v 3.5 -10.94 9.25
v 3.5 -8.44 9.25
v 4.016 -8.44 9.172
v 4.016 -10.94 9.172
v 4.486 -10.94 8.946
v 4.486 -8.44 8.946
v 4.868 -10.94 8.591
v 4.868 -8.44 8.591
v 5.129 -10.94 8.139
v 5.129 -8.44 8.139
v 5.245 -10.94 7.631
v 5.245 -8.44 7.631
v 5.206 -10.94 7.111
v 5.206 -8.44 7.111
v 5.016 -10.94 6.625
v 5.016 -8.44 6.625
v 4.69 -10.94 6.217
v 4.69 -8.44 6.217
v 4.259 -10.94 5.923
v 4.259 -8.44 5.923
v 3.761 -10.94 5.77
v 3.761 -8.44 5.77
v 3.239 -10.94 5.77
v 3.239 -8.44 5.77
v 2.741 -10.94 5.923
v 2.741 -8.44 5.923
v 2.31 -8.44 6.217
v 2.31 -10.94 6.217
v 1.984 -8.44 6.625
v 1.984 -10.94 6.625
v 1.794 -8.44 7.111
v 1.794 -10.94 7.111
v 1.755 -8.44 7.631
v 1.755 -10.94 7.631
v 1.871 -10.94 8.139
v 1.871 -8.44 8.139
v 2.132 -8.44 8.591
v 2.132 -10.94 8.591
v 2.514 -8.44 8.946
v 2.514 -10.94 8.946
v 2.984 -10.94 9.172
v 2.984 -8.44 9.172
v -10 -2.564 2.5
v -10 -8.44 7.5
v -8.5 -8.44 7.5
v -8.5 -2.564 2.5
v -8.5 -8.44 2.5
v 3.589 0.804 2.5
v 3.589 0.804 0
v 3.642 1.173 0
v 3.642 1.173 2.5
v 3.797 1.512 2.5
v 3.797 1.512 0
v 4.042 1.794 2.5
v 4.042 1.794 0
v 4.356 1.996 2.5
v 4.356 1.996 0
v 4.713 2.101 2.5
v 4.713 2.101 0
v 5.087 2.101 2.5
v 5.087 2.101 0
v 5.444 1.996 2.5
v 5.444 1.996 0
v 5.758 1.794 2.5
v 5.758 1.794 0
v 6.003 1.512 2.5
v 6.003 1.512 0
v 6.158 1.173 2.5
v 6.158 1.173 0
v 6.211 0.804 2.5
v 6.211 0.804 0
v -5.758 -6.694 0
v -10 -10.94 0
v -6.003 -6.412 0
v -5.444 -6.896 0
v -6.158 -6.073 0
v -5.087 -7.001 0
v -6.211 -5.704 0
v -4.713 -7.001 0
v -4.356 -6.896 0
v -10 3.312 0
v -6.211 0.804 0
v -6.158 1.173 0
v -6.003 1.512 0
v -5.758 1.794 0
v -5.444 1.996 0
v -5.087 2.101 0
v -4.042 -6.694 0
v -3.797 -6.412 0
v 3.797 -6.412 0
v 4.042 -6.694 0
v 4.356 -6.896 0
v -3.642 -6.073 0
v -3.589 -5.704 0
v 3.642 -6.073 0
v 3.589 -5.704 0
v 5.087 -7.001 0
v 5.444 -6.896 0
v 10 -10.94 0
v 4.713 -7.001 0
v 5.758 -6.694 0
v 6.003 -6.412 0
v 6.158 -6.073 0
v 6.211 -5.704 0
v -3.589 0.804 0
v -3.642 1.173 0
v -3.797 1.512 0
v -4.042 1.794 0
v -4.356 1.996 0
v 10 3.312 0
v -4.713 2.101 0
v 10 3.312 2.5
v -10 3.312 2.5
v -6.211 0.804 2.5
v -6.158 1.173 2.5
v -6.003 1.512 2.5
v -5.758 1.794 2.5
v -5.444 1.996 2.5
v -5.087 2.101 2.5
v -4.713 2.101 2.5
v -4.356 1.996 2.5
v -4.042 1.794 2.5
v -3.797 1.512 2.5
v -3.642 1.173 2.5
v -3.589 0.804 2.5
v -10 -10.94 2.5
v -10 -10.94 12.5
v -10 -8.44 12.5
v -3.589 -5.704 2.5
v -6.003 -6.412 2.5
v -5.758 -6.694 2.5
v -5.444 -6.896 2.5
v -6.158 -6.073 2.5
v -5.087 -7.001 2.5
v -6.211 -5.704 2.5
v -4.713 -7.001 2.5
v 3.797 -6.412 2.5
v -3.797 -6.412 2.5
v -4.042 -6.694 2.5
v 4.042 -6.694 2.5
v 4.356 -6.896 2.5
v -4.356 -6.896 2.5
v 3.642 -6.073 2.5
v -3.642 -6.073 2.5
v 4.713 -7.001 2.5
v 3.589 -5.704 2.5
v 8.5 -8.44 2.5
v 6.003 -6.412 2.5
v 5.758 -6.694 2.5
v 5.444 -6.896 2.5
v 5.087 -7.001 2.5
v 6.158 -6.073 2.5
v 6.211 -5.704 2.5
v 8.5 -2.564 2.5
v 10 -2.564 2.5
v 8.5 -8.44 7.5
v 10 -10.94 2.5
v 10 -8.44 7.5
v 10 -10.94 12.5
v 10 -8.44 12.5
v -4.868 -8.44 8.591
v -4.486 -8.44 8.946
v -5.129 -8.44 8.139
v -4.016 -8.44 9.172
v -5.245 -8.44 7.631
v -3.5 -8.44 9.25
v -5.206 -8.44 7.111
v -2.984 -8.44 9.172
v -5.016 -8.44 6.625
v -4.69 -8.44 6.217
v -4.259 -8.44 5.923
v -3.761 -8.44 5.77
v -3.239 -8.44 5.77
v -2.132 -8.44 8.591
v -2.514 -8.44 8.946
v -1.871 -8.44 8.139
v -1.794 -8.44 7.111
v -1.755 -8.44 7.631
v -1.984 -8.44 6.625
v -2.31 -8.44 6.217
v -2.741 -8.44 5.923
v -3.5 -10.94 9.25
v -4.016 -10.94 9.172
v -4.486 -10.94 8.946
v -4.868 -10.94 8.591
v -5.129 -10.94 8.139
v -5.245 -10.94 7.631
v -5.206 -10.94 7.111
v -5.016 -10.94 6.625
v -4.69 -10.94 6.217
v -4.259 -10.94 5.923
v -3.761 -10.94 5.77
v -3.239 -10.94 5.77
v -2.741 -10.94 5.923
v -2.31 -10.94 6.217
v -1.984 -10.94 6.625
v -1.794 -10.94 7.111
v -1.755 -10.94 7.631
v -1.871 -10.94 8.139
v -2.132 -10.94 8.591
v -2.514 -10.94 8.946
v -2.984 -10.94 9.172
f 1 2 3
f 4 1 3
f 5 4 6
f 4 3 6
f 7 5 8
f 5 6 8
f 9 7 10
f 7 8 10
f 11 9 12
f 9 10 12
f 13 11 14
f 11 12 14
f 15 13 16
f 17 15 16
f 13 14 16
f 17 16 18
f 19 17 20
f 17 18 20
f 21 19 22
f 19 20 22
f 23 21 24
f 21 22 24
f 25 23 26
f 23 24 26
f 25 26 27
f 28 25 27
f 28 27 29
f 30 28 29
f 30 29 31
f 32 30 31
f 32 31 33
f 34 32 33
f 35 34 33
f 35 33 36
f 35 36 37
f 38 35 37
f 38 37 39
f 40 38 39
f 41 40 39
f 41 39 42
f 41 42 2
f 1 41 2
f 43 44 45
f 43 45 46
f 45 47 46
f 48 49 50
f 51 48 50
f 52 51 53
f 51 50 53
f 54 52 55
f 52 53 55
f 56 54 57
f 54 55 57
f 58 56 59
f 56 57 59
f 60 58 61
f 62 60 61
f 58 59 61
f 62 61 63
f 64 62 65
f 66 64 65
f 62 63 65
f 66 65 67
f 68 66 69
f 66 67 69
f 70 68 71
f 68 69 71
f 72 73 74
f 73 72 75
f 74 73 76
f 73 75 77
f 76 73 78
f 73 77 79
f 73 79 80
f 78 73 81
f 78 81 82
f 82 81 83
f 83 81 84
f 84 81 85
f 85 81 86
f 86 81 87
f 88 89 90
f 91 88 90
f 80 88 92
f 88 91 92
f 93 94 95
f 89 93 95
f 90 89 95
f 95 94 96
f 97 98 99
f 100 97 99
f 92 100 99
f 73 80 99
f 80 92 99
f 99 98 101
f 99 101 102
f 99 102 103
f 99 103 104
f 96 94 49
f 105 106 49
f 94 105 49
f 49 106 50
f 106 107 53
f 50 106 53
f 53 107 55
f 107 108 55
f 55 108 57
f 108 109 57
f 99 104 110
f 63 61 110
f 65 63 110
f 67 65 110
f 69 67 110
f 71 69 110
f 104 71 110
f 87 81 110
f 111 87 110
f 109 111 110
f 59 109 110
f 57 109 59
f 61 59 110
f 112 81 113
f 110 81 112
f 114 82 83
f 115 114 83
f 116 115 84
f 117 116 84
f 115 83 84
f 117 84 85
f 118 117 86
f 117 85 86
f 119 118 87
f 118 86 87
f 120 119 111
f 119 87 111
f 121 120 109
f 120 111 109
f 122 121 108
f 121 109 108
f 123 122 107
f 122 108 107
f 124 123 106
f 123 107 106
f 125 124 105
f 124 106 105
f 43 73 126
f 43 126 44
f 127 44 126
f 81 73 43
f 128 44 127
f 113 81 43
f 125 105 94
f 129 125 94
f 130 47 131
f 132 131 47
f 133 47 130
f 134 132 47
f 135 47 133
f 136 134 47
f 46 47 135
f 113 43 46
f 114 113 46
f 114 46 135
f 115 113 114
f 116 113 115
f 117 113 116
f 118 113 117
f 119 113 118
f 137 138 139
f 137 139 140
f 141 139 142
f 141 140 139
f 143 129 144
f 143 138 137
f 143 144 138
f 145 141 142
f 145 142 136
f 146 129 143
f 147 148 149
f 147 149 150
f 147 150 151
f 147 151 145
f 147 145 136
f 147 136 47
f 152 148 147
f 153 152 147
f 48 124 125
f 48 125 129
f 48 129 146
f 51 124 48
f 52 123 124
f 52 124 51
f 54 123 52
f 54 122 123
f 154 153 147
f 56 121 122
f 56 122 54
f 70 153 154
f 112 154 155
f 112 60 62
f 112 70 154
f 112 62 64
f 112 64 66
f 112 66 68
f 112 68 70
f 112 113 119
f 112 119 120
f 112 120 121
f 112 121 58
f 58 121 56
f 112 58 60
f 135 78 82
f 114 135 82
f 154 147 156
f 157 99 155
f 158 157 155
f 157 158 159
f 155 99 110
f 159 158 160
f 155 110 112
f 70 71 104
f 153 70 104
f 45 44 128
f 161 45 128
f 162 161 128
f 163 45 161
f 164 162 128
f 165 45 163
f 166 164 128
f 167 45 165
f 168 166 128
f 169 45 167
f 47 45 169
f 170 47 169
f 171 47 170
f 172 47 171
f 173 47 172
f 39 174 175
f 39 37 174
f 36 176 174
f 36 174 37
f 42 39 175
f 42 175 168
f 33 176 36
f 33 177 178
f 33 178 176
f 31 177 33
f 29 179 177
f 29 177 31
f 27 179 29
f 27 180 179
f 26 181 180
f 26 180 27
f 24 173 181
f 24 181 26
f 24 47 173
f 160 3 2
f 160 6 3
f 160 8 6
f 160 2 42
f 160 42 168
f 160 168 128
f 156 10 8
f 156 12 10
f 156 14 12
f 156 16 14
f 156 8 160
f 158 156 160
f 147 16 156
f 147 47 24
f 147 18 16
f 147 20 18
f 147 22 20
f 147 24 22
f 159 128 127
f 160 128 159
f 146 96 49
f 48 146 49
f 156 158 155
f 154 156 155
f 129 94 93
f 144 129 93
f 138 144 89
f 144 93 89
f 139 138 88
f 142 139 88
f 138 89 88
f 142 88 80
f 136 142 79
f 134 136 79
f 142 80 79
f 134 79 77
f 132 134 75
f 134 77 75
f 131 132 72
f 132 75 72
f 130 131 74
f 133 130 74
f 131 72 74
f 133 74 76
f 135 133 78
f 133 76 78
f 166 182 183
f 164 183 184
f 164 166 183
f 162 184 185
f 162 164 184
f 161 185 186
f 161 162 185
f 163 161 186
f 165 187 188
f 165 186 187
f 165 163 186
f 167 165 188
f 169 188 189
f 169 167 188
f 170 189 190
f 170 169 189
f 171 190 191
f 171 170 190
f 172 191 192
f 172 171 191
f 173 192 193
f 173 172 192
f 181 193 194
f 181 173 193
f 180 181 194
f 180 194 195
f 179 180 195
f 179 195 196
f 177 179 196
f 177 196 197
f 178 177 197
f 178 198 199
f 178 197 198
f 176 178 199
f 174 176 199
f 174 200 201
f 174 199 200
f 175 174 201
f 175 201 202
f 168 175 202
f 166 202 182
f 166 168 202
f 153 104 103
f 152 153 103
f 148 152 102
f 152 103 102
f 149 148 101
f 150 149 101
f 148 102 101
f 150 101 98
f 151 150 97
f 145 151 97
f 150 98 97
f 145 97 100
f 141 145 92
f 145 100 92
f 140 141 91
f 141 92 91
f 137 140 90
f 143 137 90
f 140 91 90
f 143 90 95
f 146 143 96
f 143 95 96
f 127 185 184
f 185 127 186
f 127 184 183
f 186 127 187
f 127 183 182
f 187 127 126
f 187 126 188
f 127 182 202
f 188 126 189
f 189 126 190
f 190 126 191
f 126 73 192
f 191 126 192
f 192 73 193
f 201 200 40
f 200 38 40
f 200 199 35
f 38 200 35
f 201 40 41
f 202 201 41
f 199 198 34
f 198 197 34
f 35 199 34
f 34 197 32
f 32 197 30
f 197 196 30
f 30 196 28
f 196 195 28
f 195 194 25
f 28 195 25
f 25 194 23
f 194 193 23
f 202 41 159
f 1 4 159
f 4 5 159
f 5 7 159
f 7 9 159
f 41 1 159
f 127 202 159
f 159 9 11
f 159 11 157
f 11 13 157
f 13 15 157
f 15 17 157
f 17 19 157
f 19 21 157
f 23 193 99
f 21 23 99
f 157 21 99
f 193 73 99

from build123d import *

# Parameters (mm, degrees)
SKETCH1_W           = 20
SKETCH1_H           = 14.251299249
BOSS_EXTRUDE1_DEPTH = 2.5
SKETCH2_W           = 20
SKETCH2_H           = 2.5
BOSS_EXTRUDE2_DEPTH = 10
BOSS_EXTRUDE5_DEPTH = 1.5
SKETCH4_R           = 1.75
CUT_EXTRUDE1_DEPTH  = 20.858072264


with BuildPart() as part:
    # Sketch1 → Boss-Extrude1 (new body)
    with BuildSketch(Plane.XY):
        with Locations((0, -3.814013666)):
            Rectangle(SKETCH1_W, SKETCH1_H)
        with BuildLine():
            Line((-6.210661491, -5.703500897), (-6.210661491, 0.803500897))
            ThreePointArc((-6.210661491, 0.803500897), (-4.9, 2.114162388), (-3.589338509, 0.803500897))
            Line((-3.589338509, 0.803500897), (-3.589338509, -5.703500897))
            ThreePointArc((-3.589338509, -5.703500897), (-4.9, -7.014162388), (-6.210661491, -5.703500897))
        make_face(mode=Mode.SUBTRACT)
        with BuildLine():
            Line((3.589338509, -5.703500897), (3.589338509, 0.803500897))
            ThreePointArc((3.589338509, 0.803500897), (4.9, 2.114162388), (6.210661491, 0.803500897))
            Line((6.210661491, 0.803500897), (6.210661491, -5.703500897))
            ThreePointArc((6.210661491, -5.703500897), (4.9, -7.014162388), (3.589338509, -5.703500897))
        make_face(mode=Mode.SUBTRACT)
    extrude(amount=BOSS_EXTRUDE1_DEPTH)

    # Sketch2 → Boss-Extrude2 (add)
    with BuildSketch(Plane.XY.offset(2.5)):
        with Locations((0, -9.68966329)):
            Rectangle(SKETCH2_W, SKETCH2_H)
    extrude(amount=BOSS_EXTRUDE2_DEPTH)

    # Sketch3 → Boss-Extrude5 (add)
    with BuildSketch(Plane(origin=(10, 0, 0), x_dir=(0, 0, -1), z_dir=(1, 0, 0))):
        Polygon((-7.5, -8.43966329), (-2.5, -2.564013666), (-2.5, -8.43966329), align=None)
    boss_extrude5 = extrude(amount=-BOSS_EXTRUDE5_DEPTH)

    # Sketch4 → Cut-Extrude1 (cut, through all)
    with BuildSketch(Plane(origin=(0, -8.43966329, 0), x_dir=(1, 0, 0), z_dir=(0, 1, 0))):
        with Locations(Location((3.5, -7.5, 0), (0, 0, 270))):
            Circle(SKETCH4_R)
    cut_extrude1 = extrude(amount=-CUT_EXTRUDE1_DEPTH, mode=Mode.SUBTRACT)

    # Mirror1: Boss-Extrude5, Cut-Extrude1 across plane
    add(boss_extrude5.mirror(Plane.ZY))
    add(cut_extrude1.mirror(Plane.ZY), mode=Mode.SUBTRACT)


solid = part.part
